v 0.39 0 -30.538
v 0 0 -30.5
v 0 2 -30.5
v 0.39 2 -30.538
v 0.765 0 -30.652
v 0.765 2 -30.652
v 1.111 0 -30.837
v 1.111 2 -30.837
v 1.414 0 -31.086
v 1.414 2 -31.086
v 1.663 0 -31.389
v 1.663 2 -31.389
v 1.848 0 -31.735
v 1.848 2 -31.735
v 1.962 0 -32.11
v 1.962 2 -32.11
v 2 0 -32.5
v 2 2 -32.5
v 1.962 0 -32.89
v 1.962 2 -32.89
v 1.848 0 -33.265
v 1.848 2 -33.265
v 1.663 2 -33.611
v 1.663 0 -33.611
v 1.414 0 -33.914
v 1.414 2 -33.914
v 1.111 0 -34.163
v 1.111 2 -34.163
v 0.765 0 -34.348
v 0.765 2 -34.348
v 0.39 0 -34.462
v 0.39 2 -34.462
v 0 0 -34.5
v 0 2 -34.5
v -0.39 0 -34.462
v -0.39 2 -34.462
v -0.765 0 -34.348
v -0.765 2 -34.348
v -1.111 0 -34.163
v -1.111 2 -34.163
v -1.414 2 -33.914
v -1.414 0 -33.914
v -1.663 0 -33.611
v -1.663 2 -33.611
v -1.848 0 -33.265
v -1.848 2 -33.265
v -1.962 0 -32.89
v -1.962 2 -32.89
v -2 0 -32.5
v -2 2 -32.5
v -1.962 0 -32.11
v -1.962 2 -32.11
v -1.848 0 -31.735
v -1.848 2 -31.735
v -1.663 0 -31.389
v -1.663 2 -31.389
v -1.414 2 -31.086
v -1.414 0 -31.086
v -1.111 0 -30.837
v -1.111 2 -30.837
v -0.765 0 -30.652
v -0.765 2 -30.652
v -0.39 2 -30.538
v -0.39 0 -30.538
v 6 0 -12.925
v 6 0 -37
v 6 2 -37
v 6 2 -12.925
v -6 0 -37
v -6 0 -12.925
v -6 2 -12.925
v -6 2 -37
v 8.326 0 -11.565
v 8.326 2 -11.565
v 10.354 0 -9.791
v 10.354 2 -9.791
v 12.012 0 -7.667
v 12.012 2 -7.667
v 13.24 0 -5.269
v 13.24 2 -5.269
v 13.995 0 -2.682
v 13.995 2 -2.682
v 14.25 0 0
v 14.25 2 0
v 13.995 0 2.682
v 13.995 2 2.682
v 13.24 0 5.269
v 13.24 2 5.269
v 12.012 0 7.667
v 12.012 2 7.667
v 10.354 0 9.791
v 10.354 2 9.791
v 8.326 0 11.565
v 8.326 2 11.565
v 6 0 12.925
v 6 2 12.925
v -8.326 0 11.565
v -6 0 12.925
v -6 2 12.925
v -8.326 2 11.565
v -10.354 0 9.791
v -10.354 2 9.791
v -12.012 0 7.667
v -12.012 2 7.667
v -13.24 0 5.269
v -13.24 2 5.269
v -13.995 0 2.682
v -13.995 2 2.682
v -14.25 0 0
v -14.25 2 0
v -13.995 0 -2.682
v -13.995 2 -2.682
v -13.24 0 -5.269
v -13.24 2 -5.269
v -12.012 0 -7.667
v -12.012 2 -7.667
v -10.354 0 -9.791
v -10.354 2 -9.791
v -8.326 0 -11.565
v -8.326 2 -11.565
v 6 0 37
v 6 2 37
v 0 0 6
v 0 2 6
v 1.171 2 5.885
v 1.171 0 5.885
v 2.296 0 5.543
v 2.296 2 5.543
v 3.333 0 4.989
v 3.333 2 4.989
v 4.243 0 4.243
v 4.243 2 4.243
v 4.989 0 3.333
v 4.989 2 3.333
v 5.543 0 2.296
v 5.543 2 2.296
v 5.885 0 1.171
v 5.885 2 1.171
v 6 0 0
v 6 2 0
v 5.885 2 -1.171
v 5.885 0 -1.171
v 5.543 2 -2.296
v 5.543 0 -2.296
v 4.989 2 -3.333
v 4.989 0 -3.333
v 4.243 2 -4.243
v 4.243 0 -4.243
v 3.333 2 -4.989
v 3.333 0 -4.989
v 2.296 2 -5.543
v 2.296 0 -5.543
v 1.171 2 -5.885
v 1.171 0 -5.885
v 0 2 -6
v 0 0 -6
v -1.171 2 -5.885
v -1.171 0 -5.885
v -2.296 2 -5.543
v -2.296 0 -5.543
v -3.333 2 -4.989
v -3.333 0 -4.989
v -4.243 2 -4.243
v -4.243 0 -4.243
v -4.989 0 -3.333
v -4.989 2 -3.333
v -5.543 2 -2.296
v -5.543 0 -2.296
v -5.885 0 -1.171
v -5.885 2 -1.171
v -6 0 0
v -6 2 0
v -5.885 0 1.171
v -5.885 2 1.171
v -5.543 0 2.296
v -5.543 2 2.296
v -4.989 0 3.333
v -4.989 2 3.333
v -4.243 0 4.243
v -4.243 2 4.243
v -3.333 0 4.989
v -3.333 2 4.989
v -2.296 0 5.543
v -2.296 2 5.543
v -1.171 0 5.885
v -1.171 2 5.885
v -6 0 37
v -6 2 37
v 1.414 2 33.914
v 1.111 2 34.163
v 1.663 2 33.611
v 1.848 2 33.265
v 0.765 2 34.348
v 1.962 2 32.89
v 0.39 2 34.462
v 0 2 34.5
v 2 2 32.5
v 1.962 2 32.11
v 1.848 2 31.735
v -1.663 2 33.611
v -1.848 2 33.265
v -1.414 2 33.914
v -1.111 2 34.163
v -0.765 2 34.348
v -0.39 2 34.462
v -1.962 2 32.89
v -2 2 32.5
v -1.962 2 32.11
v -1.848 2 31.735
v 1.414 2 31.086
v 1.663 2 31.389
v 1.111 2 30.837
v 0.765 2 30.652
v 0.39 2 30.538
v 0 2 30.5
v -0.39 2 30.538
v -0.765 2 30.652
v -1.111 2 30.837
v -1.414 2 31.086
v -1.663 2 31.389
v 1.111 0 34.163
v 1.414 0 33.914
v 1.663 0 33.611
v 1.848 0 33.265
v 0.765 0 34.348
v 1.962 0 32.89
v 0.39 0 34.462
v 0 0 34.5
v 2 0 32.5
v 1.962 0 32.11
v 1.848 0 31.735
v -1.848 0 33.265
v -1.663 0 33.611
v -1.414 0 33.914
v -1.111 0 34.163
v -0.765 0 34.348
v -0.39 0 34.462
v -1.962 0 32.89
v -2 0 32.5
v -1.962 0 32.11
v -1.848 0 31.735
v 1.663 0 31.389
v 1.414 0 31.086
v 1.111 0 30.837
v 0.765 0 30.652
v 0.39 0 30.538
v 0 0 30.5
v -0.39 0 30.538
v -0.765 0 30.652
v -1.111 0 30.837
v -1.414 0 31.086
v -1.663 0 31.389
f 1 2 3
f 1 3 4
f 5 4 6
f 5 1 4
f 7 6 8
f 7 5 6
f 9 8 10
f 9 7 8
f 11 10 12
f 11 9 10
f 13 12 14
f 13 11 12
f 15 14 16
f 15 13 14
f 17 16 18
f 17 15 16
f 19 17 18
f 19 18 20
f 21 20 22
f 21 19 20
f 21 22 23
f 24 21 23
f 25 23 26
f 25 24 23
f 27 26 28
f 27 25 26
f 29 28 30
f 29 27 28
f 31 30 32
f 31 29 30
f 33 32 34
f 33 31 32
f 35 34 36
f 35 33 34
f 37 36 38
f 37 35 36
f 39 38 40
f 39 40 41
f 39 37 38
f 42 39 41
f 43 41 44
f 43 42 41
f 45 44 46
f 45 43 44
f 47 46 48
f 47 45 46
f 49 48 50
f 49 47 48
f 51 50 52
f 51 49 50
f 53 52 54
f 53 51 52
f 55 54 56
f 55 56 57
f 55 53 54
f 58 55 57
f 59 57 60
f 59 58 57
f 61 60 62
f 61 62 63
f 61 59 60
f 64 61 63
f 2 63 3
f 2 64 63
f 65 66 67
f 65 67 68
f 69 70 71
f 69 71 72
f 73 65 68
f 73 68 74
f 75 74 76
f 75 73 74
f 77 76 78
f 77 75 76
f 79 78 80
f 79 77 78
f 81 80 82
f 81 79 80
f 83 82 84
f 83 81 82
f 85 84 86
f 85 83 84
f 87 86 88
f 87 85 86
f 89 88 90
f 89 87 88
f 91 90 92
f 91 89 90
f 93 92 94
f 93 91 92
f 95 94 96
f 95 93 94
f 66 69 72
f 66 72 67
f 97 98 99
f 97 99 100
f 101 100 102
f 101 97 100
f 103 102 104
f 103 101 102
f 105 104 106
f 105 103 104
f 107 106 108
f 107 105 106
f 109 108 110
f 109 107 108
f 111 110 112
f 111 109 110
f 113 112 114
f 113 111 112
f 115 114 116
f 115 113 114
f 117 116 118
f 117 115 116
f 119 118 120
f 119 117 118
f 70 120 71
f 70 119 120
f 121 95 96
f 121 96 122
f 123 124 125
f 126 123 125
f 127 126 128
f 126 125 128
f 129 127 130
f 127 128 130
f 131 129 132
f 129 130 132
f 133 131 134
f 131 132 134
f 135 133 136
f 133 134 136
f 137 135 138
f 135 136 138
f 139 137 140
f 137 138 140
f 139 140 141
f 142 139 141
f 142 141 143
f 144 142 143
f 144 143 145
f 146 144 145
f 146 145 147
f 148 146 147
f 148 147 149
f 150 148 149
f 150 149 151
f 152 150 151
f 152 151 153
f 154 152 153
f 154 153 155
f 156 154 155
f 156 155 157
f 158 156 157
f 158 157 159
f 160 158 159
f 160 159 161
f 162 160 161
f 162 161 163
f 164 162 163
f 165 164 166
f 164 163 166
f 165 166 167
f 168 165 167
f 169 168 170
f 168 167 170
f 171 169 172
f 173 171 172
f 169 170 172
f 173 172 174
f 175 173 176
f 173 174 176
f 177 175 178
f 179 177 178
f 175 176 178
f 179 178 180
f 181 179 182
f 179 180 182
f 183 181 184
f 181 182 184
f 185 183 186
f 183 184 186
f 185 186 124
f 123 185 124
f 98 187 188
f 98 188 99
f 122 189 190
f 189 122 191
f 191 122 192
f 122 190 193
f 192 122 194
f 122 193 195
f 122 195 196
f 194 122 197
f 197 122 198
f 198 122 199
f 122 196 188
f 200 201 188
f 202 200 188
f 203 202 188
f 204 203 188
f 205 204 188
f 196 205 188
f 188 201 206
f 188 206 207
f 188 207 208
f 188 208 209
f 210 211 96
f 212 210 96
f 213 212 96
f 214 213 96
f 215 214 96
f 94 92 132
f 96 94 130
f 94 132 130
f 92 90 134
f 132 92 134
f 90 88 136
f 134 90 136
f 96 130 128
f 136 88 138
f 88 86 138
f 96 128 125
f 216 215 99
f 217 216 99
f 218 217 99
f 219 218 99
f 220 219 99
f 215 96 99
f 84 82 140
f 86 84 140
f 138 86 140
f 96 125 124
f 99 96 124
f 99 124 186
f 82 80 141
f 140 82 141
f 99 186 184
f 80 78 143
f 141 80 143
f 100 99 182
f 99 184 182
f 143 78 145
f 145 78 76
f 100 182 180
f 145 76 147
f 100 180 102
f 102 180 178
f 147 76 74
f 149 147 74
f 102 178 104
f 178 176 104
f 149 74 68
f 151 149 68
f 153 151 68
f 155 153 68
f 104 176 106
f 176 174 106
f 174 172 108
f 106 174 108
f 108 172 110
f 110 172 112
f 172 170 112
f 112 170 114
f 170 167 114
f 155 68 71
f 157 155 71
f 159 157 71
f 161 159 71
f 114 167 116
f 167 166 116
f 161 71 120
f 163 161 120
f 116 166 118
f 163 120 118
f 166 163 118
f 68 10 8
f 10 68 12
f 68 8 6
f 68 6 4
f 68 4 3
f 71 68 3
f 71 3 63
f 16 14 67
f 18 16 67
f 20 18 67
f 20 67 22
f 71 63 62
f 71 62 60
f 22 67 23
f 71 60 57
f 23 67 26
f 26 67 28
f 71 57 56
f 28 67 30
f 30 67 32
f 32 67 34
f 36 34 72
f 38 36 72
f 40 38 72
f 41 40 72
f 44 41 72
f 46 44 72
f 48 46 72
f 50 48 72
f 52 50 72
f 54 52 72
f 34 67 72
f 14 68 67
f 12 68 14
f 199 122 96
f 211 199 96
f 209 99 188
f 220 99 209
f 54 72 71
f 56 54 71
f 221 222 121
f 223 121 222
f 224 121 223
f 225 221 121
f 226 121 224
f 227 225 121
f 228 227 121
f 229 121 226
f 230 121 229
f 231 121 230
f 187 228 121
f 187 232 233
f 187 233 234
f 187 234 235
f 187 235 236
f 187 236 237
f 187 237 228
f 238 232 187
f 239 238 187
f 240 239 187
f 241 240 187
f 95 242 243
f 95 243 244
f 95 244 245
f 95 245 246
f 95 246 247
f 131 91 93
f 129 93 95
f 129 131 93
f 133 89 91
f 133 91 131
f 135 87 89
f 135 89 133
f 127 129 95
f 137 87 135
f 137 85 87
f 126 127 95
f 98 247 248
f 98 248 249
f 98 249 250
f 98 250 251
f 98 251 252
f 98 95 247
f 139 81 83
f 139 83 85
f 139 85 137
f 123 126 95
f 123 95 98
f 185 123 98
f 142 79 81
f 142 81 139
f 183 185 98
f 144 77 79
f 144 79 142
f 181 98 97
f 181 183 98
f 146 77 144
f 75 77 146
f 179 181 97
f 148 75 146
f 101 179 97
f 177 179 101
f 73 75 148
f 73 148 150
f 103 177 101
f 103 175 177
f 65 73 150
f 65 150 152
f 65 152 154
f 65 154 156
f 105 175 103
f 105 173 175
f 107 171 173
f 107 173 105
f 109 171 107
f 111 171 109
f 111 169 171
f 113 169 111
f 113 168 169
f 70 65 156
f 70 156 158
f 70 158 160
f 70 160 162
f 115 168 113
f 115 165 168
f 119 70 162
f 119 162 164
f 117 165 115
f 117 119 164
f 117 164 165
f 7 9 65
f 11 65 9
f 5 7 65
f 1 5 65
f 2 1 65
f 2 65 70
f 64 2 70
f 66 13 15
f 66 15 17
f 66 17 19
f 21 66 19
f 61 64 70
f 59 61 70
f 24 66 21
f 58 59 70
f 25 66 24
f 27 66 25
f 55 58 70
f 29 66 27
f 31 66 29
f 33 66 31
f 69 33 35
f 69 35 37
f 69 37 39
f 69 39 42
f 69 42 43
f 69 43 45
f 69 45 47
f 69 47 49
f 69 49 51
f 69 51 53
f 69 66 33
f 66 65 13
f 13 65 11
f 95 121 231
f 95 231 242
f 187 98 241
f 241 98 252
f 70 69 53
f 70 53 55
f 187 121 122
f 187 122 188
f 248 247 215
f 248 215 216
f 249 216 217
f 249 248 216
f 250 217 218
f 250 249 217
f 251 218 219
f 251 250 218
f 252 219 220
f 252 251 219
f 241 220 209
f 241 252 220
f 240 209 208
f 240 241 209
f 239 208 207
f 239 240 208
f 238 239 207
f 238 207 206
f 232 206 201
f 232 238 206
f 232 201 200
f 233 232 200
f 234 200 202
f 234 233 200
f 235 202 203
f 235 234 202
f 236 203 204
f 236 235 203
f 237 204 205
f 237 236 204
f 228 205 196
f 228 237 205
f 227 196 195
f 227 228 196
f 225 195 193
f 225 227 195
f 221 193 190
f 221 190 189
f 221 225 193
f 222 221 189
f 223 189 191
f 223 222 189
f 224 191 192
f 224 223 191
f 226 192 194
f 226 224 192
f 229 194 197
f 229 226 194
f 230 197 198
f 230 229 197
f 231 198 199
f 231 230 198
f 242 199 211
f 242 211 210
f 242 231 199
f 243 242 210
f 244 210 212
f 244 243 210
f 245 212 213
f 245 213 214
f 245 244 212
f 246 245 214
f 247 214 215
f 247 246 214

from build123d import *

# Parameters (mm, degrees)
SKETCH1_R           = 2
BOSS_EXTRUDE1_DEPTH = 2
CUT_EXTRUDE1_REACH  = 41.7
SKETCH2_R           = 6


with BuildPart() as part:
    # Sketch1 → Boss-Extrude1 (new body)
    with BuildSketch(Plane(origin=(0, 0, 0), x_dir=(1, 0, 0), z_dir=(0, 1, 0))):
        with BuildLine():
            Line((-6, 37), (6, 37))
            Line((6, 37), (6, 12.925265955))
            ThreePointArc((6, 12.925265955), (14.25, 0), (6, -12.925265955))
            Line((6, -12.925265955), (6, -37))
            Line((6, -37), (-6, -37))
            Line((-6, -37), (-6, -12.925265955))
            ThreePointArc((-6, -12.925265955), (-14.25, 0), (-6, 12.925265955))
            Line((-6, 12.925265955), (-6, 37))
        make_face()
        with Locations(Location((0, 32.5, 0), (0, 0, 270))):
            Circle(SKETCH1_R, mode=Mode.SUBTRACT)
        with Locations(Location((0, -32.5, 0), (0, 0, 90))):
            Circle(SKETCH1_R, mode=Mode.SUBTRACT)
    extrude(amount=BOSS_EXTRUDE1_DEPTH)

    # Sketch2 → Cut-Extrude1 (cut, up to next)
    with BuildSketch(Plane(origin=(0, 2, 0), x_dir=(1, 0, 0), z_dir=(0, 1, 0)), mode=Mode.PRIVATE) as cut_extrude1_sk1:
        with Locations(Location((0, 0, 0), (0, 0, 270))):
            Circle(SKETCH2_R)
    cut_extrude1_tool1 = extrude(cut_extrude1_sk1.sketch, amount=-CUT_EXTRUDE1_REACH, mode=Mode.PRIVATE) & part.part
    add(cut_extrude1_tool1.solids().sort_by_distance((0, 2, 0))[0], mode=Mode.SUBTRACT)


solid = part.part
